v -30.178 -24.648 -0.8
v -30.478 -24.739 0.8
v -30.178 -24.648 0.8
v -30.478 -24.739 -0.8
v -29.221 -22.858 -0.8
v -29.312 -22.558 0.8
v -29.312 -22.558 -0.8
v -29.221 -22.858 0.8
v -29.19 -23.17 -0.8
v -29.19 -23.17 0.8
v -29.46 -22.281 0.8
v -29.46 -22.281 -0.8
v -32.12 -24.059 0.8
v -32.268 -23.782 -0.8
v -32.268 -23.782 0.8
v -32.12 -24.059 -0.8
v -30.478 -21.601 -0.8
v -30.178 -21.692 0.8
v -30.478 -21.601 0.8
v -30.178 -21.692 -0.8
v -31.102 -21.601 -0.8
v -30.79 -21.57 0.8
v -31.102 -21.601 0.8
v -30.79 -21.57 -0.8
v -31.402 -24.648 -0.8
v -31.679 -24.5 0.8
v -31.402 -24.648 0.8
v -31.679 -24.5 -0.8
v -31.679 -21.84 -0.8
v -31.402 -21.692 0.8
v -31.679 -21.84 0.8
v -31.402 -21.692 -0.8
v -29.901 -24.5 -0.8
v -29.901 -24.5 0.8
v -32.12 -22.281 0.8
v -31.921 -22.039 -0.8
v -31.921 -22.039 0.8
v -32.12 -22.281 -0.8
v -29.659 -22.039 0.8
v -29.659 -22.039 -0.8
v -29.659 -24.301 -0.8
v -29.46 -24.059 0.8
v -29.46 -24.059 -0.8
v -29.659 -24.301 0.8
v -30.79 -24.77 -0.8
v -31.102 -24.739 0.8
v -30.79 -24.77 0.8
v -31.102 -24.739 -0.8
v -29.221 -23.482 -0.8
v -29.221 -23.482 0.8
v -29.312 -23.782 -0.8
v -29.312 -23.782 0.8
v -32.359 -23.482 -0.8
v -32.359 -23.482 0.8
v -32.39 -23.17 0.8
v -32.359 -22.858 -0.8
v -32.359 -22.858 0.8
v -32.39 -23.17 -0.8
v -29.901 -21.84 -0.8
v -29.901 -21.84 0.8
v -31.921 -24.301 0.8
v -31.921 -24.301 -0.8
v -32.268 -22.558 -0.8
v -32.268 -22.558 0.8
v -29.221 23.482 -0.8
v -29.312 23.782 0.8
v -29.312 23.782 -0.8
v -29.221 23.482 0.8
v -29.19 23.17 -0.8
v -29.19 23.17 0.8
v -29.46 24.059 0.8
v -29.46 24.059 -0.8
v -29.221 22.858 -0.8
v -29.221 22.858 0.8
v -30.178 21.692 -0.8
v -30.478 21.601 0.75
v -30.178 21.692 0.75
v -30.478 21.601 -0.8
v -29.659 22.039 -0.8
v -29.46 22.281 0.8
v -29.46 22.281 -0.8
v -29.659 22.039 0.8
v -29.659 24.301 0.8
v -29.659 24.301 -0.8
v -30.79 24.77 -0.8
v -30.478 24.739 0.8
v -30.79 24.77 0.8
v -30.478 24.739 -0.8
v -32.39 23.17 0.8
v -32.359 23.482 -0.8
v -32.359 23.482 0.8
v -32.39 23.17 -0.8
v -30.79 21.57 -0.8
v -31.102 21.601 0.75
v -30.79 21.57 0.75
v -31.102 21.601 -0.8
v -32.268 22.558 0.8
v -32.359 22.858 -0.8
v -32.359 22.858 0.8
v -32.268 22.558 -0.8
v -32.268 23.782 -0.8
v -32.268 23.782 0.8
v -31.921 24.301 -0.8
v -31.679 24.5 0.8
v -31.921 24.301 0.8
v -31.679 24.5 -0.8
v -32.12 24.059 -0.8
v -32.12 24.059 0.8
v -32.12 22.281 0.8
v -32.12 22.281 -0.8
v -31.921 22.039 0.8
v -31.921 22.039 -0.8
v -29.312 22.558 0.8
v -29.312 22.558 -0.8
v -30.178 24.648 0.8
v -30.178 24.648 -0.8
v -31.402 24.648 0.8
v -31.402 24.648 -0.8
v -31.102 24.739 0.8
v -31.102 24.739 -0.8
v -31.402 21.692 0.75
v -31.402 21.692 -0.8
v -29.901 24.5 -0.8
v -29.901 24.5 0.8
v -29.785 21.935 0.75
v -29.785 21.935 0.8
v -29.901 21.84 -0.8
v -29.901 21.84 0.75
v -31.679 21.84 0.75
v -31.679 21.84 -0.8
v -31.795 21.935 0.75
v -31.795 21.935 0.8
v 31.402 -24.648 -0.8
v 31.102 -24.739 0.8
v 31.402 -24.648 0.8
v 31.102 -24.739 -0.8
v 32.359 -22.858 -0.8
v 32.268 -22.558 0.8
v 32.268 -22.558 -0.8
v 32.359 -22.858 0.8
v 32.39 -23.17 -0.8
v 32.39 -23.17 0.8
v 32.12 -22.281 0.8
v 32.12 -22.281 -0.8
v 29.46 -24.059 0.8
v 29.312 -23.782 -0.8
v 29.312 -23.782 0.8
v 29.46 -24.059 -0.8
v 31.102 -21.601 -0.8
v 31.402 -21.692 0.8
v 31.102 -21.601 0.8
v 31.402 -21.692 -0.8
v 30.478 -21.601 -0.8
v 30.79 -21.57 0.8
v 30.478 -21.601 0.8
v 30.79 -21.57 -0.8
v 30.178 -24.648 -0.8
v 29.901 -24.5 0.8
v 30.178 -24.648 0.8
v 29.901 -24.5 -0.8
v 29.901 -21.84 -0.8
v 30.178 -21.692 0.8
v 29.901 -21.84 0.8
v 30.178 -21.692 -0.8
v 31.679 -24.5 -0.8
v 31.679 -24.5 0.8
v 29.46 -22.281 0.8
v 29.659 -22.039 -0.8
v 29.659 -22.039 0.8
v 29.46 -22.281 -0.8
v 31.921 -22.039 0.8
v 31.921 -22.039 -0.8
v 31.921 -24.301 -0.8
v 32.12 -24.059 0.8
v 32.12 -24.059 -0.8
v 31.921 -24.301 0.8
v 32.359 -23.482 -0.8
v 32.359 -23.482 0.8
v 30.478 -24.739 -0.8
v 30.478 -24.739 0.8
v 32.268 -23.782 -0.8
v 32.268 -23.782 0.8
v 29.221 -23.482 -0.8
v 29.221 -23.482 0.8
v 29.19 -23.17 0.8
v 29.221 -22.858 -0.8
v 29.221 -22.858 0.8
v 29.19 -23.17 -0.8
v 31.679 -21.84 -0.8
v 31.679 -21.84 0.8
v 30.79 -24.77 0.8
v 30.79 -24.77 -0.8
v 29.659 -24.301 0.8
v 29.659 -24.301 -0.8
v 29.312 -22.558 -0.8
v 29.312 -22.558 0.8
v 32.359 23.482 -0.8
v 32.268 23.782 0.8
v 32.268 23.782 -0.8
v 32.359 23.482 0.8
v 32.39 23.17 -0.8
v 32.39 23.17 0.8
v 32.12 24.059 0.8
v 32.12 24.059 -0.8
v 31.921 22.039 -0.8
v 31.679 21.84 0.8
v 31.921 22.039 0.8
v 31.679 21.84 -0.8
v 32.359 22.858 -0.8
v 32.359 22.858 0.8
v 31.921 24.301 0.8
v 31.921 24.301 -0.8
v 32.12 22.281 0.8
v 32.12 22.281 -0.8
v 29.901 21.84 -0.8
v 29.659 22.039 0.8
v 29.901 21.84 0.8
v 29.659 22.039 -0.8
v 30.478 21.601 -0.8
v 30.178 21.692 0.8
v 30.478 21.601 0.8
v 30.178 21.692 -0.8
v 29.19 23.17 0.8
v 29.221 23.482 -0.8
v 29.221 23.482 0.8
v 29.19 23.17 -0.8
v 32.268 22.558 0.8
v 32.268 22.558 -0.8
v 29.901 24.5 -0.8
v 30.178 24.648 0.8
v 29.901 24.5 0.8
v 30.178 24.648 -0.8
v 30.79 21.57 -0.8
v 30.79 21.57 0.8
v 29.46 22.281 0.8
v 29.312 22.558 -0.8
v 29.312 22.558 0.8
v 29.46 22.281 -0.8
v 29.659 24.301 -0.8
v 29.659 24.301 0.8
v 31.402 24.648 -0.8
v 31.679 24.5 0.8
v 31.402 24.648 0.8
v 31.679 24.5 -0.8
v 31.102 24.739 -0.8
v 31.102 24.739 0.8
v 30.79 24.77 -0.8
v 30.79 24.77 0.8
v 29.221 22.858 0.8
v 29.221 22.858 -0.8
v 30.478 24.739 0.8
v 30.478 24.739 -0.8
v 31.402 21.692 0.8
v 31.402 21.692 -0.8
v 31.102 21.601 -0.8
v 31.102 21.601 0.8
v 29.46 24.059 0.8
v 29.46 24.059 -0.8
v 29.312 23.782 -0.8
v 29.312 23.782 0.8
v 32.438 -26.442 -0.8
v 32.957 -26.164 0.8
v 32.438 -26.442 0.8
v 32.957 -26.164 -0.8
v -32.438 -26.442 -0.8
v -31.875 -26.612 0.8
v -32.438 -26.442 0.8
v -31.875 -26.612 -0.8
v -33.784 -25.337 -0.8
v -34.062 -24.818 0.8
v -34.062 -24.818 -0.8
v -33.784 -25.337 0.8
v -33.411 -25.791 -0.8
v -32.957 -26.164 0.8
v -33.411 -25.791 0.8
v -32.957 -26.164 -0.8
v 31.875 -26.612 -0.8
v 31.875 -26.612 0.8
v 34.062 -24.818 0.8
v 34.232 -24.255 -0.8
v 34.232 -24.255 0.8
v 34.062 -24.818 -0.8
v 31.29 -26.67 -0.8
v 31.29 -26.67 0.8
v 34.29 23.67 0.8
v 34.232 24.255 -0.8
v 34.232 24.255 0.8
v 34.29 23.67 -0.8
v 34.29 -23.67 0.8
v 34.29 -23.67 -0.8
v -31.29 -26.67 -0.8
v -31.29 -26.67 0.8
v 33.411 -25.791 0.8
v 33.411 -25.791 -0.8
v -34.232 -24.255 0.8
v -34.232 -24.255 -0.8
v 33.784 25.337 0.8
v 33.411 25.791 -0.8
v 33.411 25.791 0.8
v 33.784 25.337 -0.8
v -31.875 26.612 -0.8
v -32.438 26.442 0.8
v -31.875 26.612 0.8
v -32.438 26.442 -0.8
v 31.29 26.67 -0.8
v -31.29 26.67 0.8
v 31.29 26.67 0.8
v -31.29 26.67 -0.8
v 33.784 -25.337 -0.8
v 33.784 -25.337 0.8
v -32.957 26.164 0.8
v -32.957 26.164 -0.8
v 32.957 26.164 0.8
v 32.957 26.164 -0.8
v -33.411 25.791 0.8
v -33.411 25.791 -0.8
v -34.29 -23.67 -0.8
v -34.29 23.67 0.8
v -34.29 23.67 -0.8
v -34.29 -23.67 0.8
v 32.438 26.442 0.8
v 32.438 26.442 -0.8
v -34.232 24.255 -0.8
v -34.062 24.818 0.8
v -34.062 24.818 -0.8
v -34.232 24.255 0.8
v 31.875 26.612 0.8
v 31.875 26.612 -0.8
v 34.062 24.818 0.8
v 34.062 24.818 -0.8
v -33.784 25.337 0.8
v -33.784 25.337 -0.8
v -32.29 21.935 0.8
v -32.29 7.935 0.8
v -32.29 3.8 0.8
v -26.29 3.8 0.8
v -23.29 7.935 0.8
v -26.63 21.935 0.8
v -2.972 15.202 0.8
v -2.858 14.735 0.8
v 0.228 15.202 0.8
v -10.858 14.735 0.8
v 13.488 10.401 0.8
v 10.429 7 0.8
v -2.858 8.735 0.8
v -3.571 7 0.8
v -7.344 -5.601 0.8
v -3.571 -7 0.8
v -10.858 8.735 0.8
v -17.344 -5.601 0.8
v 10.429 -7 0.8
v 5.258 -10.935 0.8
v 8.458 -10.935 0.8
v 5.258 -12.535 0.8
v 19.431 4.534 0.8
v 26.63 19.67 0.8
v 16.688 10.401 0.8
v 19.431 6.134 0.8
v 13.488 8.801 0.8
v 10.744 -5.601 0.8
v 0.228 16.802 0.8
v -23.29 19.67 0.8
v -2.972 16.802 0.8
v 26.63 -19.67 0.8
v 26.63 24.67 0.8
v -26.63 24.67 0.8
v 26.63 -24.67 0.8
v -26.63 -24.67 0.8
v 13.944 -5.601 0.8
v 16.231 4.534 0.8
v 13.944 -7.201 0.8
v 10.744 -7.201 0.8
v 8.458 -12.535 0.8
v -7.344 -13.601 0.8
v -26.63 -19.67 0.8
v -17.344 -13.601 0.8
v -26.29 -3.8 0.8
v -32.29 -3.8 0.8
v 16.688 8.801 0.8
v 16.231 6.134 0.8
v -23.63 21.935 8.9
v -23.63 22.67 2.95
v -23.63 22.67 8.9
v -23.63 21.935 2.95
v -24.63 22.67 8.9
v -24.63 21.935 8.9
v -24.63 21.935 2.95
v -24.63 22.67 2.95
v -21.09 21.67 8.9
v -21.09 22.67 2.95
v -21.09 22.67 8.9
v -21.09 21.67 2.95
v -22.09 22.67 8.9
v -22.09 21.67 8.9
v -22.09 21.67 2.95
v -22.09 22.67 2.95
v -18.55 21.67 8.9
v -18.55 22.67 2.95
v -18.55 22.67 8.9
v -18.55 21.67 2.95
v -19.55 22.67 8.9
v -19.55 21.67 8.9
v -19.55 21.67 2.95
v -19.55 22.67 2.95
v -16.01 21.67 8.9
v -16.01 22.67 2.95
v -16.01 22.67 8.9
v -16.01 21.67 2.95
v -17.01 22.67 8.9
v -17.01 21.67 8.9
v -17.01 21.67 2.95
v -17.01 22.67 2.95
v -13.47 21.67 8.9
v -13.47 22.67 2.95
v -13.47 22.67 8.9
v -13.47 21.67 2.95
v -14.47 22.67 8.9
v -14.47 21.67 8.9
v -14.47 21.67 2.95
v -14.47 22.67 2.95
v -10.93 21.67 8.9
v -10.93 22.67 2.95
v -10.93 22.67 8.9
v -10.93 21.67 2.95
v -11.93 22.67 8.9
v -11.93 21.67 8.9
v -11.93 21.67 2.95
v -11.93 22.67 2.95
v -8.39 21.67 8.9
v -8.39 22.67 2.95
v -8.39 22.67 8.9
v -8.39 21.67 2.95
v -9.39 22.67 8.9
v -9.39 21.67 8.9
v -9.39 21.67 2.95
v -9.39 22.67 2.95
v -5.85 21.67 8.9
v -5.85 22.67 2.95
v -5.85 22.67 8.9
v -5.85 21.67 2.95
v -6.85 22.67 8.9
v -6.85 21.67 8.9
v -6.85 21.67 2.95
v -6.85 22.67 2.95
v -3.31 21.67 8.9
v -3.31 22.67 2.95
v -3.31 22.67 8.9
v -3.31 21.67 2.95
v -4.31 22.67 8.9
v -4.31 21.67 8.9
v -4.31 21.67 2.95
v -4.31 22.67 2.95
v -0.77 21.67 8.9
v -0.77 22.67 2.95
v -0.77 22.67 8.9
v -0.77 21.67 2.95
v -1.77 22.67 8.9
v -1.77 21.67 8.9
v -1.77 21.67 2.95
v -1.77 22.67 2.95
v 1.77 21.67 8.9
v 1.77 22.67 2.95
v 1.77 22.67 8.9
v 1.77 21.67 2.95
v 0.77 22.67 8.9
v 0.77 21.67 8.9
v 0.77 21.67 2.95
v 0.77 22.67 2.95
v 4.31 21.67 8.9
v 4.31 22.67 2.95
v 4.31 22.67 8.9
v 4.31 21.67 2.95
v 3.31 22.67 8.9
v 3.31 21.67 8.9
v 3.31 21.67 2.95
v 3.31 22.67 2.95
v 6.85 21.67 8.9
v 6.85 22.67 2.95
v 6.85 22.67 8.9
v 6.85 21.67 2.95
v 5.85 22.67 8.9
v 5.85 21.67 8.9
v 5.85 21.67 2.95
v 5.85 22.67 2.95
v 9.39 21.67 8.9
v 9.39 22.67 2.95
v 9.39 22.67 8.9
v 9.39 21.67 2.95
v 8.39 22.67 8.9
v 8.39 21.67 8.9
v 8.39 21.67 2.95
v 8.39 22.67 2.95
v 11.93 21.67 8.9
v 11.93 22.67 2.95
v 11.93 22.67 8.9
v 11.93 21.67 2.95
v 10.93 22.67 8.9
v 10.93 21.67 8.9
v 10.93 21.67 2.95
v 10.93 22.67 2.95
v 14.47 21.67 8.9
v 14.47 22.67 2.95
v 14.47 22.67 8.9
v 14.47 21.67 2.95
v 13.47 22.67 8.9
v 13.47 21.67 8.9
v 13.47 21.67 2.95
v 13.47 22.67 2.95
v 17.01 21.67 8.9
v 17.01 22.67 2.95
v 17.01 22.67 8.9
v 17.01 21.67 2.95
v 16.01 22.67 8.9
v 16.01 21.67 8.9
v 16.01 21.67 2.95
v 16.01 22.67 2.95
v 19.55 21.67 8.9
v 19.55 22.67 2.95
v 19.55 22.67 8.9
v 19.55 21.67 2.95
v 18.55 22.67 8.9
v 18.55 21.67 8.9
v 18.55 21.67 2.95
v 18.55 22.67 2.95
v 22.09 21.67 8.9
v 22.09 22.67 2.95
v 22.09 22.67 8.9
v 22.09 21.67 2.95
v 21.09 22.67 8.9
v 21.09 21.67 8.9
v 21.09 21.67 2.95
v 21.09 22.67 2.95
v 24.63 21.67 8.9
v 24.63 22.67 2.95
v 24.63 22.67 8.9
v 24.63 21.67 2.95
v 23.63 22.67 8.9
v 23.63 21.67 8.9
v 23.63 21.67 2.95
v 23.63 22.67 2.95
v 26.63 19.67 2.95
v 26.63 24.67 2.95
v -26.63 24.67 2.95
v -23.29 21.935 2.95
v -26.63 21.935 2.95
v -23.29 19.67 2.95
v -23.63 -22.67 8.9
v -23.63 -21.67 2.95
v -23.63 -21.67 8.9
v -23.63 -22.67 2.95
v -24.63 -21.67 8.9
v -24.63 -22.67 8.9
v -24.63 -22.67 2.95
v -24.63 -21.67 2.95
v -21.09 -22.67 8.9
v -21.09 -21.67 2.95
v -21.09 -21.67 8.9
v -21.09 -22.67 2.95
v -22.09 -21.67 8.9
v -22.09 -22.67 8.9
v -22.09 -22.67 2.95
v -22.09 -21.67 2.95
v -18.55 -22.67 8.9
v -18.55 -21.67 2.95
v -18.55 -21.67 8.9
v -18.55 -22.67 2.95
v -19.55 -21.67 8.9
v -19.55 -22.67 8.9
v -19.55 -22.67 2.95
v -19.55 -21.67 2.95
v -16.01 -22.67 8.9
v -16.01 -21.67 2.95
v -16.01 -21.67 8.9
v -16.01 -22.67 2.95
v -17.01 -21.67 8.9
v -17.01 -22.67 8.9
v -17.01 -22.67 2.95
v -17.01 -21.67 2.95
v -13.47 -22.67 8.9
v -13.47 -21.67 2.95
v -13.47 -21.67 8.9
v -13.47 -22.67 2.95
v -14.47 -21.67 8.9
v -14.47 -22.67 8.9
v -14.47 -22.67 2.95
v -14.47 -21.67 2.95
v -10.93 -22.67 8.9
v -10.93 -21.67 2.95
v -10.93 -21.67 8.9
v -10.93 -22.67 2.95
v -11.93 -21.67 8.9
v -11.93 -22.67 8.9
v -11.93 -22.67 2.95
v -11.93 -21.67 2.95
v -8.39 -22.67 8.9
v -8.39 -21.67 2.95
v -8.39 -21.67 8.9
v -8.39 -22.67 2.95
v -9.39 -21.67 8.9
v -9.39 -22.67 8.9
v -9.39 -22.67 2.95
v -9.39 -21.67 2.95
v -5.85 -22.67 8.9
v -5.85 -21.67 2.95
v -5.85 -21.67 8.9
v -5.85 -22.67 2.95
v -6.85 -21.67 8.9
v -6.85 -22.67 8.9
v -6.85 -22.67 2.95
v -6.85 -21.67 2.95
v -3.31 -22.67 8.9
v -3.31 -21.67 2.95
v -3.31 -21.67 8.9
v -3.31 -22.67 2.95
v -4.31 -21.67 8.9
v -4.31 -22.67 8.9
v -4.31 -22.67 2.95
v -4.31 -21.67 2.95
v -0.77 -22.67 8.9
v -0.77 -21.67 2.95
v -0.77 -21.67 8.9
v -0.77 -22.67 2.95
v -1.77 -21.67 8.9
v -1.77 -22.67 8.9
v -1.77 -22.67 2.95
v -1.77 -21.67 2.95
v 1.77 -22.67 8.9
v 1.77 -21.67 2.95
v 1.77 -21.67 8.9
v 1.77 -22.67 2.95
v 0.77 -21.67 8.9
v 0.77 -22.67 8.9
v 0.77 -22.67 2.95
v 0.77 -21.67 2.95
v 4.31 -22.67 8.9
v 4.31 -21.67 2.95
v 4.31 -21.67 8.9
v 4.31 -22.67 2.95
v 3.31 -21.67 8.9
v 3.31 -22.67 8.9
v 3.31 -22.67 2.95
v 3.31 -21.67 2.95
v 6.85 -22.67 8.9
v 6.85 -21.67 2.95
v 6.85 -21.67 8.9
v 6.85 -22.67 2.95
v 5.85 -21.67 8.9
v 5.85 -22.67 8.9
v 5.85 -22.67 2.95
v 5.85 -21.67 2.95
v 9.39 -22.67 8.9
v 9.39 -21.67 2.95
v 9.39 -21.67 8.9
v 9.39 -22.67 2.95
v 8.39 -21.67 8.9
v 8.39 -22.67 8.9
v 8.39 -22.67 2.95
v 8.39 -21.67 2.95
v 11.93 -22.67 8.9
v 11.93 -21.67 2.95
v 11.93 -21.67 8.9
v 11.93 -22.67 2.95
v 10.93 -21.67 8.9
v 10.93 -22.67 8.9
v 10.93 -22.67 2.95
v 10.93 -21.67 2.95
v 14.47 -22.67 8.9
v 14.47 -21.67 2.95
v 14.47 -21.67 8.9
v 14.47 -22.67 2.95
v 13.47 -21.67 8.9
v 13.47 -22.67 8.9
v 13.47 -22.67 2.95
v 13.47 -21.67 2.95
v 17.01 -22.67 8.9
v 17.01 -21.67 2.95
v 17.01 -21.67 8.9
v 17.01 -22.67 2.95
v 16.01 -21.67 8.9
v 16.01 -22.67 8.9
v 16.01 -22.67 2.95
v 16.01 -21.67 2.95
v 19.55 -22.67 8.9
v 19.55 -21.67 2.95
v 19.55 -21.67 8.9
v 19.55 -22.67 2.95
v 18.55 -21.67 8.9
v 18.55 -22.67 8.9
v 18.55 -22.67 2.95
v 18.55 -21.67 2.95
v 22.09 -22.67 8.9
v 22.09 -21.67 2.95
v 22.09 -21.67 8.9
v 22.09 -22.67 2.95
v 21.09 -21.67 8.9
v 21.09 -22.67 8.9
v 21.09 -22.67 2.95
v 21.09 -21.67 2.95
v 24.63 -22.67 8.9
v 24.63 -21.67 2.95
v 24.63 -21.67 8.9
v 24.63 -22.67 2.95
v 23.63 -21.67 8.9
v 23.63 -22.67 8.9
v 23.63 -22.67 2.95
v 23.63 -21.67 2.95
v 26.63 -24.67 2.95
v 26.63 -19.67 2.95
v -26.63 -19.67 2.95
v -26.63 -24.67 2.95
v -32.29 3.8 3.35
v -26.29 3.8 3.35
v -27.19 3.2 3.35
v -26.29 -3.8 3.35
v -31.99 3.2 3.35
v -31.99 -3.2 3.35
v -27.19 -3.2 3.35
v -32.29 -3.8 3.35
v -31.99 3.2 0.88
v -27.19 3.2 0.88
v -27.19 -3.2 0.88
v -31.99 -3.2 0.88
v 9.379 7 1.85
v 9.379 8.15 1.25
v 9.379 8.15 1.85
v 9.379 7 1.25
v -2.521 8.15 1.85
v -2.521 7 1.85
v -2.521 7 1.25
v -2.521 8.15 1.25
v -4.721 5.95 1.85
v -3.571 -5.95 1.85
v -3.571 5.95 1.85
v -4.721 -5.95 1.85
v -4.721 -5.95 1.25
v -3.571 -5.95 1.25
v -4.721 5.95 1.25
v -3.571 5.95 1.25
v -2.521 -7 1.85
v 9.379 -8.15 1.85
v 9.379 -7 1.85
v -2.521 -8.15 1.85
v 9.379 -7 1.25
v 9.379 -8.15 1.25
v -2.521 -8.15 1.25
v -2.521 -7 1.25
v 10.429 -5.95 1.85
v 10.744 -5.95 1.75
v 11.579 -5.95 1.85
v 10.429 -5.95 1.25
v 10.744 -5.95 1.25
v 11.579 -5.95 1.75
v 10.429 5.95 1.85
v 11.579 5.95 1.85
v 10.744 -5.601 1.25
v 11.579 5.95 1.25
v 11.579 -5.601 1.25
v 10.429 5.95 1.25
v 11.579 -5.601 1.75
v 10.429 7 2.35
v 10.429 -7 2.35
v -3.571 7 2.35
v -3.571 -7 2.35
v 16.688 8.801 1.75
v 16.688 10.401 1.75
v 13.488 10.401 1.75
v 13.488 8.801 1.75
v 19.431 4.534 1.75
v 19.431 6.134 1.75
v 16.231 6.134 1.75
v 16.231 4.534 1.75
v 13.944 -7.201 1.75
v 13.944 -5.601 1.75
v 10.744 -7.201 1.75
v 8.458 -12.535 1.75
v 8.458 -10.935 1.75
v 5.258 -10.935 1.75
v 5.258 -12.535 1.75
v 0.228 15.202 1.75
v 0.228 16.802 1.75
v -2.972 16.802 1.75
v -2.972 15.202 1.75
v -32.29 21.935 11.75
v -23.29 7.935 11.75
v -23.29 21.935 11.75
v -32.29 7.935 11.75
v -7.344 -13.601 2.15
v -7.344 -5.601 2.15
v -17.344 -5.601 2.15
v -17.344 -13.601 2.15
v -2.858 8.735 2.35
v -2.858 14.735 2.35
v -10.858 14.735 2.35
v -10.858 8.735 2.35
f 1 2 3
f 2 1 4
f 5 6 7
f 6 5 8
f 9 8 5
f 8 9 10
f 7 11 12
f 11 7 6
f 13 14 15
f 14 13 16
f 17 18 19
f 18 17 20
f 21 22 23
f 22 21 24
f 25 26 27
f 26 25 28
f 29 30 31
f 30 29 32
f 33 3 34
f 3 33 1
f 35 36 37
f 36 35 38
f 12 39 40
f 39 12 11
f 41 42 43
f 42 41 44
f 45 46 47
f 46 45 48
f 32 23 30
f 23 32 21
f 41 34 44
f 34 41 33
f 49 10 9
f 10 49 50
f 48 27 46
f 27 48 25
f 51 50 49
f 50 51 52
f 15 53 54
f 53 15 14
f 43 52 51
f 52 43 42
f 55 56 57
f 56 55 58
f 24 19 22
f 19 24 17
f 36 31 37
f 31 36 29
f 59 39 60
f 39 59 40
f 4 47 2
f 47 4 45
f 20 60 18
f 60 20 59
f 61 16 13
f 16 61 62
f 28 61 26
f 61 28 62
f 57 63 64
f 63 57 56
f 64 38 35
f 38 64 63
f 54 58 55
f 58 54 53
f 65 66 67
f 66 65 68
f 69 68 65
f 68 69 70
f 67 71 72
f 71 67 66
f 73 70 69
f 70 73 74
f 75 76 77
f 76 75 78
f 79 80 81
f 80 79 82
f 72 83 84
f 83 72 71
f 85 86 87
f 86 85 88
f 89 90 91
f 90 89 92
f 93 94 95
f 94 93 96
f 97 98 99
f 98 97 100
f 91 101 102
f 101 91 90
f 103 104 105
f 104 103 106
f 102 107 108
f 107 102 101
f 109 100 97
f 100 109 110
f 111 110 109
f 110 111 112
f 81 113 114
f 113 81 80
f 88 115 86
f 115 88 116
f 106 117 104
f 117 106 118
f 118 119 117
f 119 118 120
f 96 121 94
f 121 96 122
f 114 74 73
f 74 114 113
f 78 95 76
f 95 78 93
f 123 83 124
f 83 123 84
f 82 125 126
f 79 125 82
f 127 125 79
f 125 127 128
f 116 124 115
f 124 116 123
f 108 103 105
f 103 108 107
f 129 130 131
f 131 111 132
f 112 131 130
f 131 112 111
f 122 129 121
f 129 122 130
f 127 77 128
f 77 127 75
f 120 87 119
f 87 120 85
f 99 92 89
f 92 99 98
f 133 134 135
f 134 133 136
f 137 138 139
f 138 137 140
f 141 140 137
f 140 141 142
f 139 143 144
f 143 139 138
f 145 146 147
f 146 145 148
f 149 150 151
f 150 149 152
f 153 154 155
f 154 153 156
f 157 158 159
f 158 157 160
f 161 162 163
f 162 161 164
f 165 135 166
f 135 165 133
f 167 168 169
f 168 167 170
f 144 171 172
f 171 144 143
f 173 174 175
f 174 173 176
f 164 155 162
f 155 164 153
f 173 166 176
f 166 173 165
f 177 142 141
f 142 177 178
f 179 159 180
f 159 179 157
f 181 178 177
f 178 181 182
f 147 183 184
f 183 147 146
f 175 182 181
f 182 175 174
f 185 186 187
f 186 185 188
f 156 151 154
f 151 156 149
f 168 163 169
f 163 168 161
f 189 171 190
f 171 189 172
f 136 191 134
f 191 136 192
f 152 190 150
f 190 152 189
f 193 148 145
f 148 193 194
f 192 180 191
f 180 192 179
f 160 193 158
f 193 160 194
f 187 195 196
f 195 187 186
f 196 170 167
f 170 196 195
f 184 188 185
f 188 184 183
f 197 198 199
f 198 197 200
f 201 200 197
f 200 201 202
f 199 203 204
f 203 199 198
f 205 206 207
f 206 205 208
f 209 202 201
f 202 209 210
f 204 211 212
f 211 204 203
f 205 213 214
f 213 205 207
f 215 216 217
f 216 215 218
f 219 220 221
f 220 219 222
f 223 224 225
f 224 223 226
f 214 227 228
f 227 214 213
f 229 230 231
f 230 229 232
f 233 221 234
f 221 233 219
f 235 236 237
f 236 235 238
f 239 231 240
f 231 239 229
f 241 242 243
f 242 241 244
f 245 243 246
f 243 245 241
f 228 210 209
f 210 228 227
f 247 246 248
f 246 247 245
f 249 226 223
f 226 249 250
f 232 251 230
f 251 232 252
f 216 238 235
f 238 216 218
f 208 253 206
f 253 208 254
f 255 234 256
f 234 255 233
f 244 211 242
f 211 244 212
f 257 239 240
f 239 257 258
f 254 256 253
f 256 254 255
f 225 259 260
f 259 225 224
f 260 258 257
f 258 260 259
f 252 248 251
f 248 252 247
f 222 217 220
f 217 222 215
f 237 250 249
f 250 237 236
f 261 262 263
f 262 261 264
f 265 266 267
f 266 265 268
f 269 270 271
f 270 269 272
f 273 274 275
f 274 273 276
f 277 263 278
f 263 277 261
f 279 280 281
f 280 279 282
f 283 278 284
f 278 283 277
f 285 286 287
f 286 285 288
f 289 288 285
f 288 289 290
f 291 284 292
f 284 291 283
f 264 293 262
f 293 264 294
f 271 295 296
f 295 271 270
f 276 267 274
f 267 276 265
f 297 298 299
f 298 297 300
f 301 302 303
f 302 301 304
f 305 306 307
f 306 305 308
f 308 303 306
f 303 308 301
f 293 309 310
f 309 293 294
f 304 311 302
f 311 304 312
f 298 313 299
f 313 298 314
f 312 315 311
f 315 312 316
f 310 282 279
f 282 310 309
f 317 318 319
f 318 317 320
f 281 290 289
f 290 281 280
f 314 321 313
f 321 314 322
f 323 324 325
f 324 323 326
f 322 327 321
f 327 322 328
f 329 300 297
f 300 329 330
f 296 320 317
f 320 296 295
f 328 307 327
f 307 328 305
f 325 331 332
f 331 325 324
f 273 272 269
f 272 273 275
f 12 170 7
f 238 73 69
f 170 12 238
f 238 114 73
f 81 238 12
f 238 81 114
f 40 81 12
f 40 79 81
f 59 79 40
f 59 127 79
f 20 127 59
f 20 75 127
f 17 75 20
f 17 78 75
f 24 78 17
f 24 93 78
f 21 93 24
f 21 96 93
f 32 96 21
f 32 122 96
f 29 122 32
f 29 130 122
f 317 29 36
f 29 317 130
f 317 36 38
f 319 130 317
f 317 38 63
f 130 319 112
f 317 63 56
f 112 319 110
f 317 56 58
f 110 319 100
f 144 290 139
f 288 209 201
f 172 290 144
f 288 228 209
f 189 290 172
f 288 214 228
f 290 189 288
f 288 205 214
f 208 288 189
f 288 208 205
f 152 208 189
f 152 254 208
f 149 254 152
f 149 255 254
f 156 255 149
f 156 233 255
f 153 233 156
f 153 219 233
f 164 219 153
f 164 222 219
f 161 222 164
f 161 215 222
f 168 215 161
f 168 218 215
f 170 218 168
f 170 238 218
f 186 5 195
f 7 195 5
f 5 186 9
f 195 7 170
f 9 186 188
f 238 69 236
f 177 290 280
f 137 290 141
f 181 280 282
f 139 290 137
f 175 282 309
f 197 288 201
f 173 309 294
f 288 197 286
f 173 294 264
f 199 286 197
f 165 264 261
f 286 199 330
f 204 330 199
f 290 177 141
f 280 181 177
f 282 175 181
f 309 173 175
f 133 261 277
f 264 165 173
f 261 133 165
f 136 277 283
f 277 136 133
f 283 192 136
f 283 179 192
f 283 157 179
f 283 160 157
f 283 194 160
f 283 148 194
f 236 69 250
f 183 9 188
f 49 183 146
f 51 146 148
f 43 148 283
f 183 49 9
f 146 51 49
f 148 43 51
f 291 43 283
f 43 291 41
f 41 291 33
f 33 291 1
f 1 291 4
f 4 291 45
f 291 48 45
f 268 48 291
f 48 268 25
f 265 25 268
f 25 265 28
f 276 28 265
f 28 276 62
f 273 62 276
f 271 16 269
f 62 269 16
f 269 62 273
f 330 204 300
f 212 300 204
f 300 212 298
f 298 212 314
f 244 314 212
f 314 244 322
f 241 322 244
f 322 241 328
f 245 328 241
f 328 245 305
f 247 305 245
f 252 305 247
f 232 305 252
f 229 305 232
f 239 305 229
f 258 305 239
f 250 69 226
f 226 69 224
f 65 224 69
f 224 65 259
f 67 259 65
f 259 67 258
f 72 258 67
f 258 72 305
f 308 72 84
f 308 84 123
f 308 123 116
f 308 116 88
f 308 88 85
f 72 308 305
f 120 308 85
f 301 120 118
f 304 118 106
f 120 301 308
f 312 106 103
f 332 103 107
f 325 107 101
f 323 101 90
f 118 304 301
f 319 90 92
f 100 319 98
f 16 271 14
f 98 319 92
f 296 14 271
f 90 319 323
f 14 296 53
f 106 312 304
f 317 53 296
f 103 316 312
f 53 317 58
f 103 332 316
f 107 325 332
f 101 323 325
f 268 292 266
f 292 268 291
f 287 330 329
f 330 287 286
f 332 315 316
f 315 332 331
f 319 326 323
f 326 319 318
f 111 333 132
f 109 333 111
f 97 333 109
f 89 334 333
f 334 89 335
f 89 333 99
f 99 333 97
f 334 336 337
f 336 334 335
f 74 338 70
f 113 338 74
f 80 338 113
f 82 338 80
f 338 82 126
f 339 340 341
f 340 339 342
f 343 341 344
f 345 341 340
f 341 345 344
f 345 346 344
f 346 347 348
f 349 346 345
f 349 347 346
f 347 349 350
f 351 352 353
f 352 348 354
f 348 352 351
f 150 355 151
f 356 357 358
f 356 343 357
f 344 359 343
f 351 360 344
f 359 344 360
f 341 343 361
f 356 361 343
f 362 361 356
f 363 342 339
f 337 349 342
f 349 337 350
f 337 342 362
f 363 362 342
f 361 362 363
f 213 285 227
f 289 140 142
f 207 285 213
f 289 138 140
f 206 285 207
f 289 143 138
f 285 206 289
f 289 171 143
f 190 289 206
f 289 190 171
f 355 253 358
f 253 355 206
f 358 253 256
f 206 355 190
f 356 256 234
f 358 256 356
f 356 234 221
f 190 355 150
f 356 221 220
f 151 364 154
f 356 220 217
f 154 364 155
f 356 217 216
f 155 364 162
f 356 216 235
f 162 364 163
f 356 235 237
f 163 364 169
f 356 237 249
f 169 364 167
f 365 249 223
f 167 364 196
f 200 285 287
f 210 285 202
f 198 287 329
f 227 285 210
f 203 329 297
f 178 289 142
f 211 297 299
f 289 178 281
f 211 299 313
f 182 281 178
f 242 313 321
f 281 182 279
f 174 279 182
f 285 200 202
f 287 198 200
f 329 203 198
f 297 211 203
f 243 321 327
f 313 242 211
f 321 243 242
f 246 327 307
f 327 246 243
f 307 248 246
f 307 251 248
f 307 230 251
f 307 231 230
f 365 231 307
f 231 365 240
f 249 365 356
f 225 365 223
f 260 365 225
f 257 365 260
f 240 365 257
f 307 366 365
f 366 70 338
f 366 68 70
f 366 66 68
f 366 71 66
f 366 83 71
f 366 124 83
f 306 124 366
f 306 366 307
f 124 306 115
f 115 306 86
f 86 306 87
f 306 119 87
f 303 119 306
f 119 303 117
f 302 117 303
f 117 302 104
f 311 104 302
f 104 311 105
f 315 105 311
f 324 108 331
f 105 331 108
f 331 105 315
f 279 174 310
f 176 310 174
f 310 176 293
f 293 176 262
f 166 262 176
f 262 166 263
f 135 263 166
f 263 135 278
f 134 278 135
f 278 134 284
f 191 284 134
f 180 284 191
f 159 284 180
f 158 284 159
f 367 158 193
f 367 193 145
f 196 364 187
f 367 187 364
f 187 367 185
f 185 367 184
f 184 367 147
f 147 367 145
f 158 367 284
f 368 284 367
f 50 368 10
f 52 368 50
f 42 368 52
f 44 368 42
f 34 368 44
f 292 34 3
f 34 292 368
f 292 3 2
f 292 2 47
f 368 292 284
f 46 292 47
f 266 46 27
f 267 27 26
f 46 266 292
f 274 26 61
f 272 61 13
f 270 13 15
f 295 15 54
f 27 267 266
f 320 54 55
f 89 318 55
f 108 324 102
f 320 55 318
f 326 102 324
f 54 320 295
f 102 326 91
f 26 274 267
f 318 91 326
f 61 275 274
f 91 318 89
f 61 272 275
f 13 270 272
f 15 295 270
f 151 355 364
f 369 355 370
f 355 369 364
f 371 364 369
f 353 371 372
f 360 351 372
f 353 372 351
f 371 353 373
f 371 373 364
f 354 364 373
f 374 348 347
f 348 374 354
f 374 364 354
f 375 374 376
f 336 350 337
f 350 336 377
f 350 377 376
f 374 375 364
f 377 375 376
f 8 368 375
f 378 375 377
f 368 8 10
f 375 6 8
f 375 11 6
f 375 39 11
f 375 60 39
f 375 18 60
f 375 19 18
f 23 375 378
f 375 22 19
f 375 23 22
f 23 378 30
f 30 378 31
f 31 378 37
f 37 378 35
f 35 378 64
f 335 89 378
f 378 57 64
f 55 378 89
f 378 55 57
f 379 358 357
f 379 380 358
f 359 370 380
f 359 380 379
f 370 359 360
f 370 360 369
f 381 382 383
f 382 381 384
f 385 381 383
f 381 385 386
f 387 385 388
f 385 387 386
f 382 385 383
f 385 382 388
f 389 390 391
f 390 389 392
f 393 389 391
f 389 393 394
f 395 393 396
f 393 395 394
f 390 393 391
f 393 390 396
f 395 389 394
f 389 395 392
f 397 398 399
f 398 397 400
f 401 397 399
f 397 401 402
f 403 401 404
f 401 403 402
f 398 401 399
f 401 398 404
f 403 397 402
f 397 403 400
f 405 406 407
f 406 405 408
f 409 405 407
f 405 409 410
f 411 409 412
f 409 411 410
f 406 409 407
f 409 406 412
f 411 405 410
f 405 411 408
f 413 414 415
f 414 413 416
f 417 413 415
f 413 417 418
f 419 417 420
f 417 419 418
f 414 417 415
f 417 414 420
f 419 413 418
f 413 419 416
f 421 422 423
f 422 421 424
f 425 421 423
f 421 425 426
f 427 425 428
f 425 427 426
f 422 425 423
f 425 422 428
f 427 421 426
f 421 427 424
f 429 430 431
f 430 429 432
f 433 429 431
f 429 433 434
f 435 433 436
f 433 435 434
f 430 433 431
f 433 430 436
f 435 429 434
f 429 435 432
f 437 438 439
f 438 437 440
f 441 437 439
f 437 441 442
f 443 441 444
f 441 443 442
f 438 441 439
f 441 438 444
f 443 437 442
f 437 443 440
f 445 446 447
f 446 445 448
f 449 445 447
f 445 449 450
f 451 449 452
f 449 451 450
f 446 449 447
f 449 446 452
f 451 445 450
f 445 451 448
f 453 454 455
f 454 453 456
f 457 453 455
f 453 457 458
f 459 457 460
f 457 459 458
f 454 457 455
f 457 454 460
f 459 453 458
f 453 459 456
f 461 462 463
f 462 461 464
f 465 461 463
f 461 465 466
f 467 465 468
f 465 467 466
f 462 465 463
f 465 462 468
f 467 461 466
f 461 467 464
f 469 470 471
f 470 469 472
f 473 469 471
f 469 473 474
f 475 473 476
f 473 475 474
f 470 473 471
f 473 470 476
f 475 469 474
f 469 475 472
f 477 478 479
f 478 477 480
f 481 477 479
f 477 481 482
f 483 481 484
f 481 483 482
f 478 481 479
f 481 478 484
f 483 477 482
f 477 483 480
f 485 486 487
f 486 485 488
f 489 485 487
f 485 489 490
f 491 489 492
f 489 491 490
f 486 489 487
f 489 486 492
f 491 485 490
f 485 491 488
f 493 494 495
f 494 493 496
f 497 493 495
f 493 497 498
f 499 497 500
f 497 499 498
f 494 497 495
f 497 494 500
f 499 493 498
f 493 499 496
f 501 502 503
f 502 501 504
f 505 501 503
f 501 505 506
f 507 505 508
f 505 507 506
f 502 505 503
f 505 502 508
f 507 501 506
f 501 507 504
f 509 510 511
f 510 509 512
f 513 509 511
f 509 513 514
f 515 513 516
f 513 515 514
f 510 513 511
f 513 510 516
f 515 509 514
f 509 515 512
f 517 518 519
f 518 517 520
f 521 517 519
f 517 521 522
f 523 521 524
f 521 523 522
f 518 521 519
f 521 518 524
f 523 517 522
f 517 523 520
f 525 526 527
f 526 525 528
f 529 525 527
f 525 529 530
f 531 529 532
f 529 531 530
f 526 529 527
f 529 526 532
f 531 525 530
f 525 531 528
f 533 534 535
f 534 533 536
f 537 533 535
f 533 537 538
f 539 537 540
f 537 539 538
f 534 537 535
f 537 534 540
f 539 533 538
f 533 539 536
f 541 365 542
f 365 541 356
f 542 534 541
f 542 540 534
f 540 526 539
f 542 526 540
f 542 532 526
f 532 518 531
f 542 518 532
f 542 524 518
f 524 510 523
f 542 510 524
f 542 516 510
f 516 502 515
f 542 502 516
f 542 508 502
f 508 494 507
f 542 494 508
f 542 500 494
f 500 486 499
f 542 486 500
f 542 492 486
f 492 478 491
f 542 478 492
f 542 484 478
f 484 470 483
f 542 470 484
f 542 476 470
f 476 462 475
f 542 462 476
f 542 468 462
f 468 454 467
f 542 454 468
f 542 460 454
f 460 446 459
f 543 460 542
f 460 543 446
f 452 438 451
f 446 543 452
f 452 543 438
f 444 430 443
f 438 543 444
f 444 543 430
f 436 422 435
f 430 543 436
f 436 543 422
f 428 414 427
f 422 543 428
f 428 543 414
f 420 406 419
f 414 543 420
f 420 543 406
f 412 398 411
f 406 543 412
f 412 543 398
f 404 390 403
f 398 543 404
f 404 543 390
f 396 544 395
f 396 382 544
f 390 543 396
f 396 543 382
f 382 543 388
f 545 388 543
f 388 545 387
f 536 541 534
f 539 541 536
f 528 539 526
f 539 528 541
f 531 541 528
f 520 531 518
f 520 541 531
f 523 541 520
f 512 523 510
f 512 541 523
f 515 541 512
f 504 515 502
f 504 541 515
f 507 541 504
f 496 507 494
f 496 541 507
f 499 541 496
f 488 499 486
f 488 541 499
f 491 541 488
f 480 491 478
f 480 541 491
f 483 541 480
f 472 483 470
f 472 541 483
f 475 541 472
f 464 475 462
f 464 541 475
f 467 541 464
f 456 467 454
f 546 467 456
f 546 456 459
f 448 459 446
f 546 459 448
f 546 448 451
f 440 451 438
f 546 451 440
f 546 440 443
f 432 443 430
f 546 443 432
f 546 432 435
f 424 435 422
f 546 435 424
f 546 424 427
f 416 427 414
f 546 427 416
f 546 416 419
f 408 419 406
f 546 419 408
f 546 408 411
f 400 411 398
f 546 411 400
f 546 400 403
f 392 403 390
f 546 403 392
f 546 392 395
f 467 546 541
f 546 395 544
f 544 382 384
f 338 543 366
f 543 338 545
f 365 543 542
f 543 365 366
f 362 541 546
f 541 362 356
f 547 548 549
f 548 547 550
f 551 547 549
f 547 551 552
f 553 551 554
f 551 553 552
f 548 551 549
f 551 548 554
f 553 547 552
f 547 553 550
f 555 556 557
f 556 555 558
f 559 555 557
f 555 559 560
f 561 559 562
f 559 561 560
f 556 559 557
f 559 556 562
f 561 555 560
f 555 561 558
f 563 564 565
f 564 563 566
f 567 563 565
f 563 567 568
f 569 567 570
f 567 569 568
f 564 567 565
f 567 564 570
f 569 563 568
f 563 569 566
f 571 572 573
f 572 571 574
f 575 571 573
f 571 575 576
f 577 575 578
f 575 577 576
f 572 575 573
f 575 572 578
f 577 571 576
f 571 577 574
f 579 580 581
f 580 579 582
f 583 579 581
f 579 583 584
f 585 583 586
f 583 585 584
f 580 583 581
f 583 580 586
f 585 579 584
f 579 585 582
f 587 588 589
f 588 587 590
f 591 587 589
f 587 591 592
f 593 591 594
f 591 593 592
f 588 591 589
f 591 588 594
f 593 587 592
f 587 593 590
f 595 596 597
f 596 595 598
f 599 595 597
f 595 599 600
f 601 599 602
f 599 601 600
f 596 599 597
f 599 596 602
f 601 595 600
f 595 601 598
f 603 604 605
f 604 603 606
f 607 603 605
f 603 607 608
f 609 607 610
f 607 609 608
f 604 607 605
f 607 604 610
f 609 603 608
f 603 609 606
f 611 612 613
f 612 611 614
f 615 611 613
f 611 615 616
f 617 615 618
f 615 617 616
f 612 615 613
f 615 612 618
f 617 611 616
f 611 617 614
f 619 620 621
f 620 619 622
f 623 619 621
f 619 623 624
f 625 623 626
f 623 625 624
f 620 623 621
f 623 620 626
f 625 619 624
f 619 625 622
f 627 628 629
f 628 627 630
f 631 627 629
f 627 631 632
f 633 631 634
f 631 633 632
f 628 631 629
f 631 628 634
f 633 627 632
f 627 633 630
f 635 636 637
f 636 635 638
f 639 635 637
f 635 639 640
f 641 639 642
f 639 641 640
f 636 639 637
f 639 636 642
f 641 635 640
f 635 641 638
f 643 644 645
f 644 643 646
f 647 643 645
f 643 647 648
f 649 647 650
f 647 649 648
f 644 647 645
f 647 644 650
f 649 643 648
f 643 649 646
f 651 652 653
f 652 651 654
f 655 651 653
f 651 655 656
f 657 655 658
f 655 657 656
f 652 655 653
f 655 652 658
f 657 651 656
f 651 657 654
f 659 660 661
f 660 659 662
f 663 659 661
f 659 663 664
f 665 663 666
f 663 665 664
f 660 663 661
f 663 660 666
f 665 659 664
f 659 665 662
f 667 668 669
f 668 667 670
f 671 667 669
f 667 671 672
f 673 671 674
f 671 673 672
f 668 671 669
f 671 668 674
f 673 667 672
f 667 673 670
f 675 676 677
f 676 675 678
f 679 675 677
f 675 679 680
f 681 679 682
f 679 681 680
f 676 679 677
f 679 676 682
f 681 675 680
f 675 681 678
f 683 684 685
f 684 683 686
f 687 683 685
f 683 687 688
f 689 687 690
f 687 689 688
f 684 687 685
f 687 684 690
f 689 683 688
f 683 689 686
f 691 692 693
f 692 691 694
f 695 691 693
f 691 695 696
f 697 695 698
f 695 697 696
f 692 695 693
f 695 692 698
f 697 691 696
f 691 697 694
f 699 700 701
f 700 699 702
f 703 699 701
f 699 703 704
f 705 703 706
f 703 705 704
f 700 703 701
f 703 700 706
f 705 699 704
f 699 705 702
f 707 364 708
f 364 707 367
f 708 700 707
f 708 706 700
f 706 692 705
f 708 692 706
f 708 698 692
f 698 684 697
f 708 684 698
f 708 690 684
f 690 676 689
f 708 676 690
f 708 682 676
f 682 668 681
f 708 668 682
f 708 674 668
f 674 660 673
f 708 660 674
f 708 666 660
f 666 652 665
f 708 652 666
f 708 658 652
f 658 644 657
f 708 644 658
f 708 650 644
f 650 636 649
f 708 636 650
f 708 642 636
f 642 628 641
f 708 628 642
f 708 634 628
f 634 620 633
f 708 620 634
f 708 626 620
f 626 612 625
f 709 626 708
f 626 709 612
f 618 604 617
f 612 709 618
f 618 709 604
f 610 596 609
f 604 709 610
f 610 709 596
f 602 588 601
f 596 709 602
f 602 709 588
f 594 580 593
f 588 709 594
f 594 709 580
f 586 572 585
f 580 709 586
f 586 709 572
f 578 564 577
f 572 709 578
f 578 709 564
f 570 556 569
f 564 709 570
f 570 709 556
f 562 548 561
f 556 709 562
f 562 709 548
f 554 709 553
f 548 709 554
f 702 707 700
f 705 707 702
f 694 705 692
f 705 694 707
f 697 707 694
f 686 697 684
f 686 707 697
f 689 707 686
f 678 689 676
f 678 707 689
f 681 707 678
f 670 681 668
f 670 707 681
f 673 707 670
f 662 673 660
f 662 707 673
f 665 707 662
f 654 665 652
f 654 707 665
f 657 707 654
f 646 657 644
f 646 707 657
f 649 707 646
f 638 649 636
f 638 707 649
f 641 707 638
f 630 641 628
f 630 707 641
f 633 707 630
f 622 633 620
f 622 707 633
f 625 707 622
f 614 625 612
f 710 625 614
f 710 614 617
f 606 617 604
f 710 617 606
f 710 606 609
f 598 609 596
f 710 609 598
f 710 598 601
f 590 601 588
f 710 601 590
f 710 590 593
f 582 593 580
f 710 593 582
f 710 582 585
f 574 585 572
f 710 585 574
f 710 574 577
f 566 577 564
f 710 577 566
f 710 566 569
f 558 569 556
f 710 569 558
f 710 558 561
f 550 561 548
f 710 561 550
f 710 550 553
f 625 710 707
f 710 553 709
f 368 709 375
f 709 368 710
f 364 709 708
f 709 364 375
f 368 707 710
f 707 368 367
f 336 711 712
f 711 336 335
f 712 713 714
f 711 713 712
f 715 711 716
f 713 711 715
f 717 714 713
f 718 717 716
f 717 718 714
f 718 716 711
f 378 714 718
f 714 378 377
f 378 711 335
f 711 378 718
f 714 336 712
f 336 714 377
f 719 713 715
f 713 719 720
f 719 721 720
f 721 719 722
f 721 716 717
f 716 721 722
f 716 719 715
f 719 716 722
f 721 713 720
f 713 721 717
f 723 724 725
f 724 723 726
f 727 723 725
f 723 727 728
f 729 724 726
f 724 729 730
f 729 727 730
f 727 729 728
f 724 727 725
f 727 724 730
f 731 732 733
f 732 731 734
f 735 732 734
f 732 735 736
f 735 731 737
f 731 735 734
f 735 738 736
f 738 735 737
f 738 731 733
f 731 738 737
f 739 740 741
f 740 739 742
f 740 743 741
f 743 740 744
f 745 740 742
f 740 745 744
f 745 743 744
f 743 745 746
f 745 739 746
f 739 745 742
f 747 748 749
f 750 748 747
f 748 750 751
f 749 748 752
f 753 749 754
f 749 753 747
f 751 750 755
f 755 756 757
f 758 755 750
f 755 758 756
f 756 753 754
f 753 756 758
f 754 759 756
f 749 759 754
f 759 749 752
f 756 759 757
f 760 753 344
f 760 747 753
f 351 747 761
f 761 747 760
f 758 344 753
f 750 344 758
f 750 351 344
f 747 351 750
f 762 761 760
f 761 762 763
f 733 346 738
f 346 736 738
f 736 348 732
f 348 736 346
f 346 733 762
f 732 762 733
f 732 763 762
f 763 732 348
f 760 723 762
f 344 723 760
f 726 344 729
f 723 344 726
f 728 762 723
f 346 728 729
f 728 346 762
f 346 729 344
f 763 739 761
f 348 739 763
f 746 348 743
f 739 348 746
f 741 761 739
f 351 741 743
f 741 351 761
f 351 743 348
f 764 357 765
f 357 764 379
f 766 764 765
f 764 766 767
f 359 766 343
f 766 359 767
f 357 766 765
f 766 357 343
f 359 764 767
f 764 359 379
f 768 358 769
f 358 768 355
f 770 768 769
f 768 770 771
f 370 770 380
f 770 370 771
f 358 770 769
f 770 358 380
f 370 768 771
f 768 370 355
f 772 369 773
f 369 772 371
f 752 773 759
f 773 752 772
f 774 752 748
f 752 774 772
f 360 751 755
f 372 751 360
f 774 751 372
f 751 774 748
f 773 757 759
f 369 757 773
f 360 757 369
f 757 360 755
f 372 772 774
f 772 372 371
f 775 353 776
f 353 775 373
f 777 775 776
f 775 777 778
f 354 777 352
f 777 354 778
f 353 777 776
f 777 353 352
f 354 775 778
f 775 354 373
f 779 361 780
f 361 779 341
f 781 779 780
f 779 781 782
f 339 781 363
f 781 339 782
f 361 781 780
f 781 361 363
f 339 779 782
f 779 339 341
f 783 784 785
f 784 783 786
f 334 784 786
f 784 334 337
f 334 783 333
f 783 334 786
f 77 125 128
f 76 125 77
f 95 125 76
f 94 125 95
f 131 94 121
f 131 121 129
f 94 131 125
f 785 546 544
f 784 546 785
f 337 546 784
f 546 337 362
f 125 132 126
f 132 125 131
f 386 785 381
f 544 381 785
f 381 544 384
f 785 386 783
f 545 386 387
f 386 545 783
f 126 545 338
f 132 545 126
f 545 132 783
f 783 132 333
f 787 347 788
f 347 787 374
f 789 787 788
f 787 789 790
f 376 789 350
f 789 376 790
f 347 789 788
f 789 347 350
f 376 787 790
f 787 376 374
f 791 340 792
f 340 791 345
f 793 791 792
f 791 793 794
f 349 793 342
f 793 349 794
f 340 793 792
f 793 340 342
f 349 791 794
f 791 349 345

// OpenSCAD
$fn = 32;

// Microcontroller development board overall size (mm)
board_x = 68.58;
board_y = 53.34;
board_th = 1.6;

// Small overlap to guarantee watertight unions
eps = 0.05;

// ---------- Helpers ----------
module rounded_rect_prism(x, y, z, r) {
    // Fast rounded rectangle via 2D offset + linear_extrude
    linear_extrude(height=z, center=true, convexity=5)
        offset(r=r)
            square([x - 2*r, y - 2*r], center=true);
}

module pin_header_row(n=20, pitch=2.54, pin=1.0, h=6, base_h=2.2, base_w=5.0) {
    union() {
        // plastic base
        translate([0, 0, base_h/2])
            cube([ (n-1)*pitch + base_w, base_w, base_h ], center=true);

        // pins
        for (i = [0:n-1]) {
            x = -((n-1)*pitch)/2 + i*pitch;
            translate([x, 0, base_h + h/2 - eps])
                cube([pin, pin, h], center=true);
        }
    }
}

module usb_micro_port(w=7.6, d=6.0, h=2.6, shell=0.6) {
    // Simple USB micro-like shell block with a shallow recess
    difference() {
        translate([0, 0, h/2])
            cube([w, d, h], center=true);
        translate([0, d*0.05, h*0.55])
            cube([w - 2*shell, d - 2*shell, h], center=true);
    }
}

module barrel_jack(w=14, d=9, h=11) {
    translate([0, 0, h/2])
        cube([w, d, h], center=true);
}

module ic_qfp(body=14, h=1.6, lead=1.2, lead_w=0.6) {
    union() {
        translate([0, 0, h/2])
            cube([body, body, h], center=true);

        for (side = [0:3]) {
            rotate([0, 0, side*90])
                translate([0, body/2 + lead/2 - eps, h/2])
                    cube([body*0.85, lead, lead_w], center=true);
        }
    }
}

module smd_chip(x=6, y=6, h=1.2) {
    translate([0, 0, h/2])
        cube([x, y, h], center=true);
}

module mounting_hole_pattern(hole_d=3.2, inset=3.5) {
    for (sx = [-1, 1], sy = [-1, 1]) {
        translate([sx*(board_x/2 - inset), sy*(board_y/2 - inset), 0])
            cylinder(d=hole_d, h=board_th + 2, center=true);
    }
}

// ---------- Board Model ----------
module dev_board() {
    corner_r = 3.0;

    z_top = board_th/2;

    header_n = 20;
    header_pitch = 2.54;
    header_base_w = 5.0;
    header_base_h = 2.2;
    header_pin_h = 6.0;

    header_y_offset = board_y/2 - (header_base_w/2) - 2.0;

    usb_w = 7.6; usb_d = 6.0; usb_h = 2.6;
    jack_w = 14; jack_d = 9; jack_h = 11;

    conn_edge_inset = 2.0;
    usb_x  = -board_x/2 + conn_edge_inset + usb_d/2;
    jack_x = -board_x/2 + conn_edge_inset + jack_d/2;

    usb_y = 0;
    jack_y = board_y*0.28;

    mcu_x = board_x*0.05;
    mcu_y = 0;

    sec_x = -board_x*0.18;
    sec_y = -board_y*0.18;

    reg_x = -board_x*0.10;
    reg_y = board_y*0.22;

    union() {
        // PCB with mounting holes (single difference)
        difference() {
            color([0.05, 0.45, 0.18])
                rounded_rect_prism(board_x, board_y, board_th, corner_r);
            mounting_hole_pattern(3.2, 3.5);
        }

        // Headers
        color([0.1, 0.1, 0.1])
        translate([0,  header_y_offset, z_top - eps])
            pin_header_row(n=header_n, pitch=header_pitch, pin=1.0, h=header_pin_h, base_h=header_base_h, base_w=header_base_w);

        color([0.1, 0.1, 0.1])
        translate([0, -header_y_offset, z_top - eps])
            pin_header_row(n=header_n, pitch=header_pitch, pin=1.0, h=header_pin_h, base_h=header_base_h, base_w=header_base_w);

        // USB port
        color([0.75, 0.75, 0.78])
        translate([usb_x, usb_y, z_top - eps])
            rotate([0, 0, 90])
                usb_micro_port(w=usb_w, d=usb_d, h=usb_h, shell=0.6);

        // Barrel jack
        color([0.05, 0.05, 0.05])
        translate([jack_x, jack_y, z_top - eps])
            rotate([0, 0, 90])
                barrel_jack(w=jack_w, d=jack_d, h=jack_h);

        // MCU
        color([0.15, 0.15, 0.15])
        translate([mcu_x, mcu_y, z_top - eps])
            ic_qfp(body=14, h=1.6, lead=1.2, lead_w=0.6);

        // Secondary chip
        color([0.18, 0.18, 0.18])
        translate([sec_x, sec_y, z_top - eps])
            smd_chip(10, 8, 1.4);

        // Regulator / power block
        color([0.2, 0.2, 0.2])
        translate([reg_x, reg_y, z_top - eps])
            smd_chip(8, 6, 1.6);

        // Small passives
        color([0.85, 0.82, 0.75])
        for (p = [
            [board_x*0.22,  board_y*0.18],
            [board_x*0.26,  board_y*0.10],
            [board_x*0.18, -board_y*0.12],
            [board_x*0.10, -board_y*0.22],
            [-board_x*0.02, board_y*0.30]
        ]) {
            translate([p[0], p[1], z_top - eps])
                smd_chip(3.2, 1.6, 1.0);
        }
    }
}

dev_board();
